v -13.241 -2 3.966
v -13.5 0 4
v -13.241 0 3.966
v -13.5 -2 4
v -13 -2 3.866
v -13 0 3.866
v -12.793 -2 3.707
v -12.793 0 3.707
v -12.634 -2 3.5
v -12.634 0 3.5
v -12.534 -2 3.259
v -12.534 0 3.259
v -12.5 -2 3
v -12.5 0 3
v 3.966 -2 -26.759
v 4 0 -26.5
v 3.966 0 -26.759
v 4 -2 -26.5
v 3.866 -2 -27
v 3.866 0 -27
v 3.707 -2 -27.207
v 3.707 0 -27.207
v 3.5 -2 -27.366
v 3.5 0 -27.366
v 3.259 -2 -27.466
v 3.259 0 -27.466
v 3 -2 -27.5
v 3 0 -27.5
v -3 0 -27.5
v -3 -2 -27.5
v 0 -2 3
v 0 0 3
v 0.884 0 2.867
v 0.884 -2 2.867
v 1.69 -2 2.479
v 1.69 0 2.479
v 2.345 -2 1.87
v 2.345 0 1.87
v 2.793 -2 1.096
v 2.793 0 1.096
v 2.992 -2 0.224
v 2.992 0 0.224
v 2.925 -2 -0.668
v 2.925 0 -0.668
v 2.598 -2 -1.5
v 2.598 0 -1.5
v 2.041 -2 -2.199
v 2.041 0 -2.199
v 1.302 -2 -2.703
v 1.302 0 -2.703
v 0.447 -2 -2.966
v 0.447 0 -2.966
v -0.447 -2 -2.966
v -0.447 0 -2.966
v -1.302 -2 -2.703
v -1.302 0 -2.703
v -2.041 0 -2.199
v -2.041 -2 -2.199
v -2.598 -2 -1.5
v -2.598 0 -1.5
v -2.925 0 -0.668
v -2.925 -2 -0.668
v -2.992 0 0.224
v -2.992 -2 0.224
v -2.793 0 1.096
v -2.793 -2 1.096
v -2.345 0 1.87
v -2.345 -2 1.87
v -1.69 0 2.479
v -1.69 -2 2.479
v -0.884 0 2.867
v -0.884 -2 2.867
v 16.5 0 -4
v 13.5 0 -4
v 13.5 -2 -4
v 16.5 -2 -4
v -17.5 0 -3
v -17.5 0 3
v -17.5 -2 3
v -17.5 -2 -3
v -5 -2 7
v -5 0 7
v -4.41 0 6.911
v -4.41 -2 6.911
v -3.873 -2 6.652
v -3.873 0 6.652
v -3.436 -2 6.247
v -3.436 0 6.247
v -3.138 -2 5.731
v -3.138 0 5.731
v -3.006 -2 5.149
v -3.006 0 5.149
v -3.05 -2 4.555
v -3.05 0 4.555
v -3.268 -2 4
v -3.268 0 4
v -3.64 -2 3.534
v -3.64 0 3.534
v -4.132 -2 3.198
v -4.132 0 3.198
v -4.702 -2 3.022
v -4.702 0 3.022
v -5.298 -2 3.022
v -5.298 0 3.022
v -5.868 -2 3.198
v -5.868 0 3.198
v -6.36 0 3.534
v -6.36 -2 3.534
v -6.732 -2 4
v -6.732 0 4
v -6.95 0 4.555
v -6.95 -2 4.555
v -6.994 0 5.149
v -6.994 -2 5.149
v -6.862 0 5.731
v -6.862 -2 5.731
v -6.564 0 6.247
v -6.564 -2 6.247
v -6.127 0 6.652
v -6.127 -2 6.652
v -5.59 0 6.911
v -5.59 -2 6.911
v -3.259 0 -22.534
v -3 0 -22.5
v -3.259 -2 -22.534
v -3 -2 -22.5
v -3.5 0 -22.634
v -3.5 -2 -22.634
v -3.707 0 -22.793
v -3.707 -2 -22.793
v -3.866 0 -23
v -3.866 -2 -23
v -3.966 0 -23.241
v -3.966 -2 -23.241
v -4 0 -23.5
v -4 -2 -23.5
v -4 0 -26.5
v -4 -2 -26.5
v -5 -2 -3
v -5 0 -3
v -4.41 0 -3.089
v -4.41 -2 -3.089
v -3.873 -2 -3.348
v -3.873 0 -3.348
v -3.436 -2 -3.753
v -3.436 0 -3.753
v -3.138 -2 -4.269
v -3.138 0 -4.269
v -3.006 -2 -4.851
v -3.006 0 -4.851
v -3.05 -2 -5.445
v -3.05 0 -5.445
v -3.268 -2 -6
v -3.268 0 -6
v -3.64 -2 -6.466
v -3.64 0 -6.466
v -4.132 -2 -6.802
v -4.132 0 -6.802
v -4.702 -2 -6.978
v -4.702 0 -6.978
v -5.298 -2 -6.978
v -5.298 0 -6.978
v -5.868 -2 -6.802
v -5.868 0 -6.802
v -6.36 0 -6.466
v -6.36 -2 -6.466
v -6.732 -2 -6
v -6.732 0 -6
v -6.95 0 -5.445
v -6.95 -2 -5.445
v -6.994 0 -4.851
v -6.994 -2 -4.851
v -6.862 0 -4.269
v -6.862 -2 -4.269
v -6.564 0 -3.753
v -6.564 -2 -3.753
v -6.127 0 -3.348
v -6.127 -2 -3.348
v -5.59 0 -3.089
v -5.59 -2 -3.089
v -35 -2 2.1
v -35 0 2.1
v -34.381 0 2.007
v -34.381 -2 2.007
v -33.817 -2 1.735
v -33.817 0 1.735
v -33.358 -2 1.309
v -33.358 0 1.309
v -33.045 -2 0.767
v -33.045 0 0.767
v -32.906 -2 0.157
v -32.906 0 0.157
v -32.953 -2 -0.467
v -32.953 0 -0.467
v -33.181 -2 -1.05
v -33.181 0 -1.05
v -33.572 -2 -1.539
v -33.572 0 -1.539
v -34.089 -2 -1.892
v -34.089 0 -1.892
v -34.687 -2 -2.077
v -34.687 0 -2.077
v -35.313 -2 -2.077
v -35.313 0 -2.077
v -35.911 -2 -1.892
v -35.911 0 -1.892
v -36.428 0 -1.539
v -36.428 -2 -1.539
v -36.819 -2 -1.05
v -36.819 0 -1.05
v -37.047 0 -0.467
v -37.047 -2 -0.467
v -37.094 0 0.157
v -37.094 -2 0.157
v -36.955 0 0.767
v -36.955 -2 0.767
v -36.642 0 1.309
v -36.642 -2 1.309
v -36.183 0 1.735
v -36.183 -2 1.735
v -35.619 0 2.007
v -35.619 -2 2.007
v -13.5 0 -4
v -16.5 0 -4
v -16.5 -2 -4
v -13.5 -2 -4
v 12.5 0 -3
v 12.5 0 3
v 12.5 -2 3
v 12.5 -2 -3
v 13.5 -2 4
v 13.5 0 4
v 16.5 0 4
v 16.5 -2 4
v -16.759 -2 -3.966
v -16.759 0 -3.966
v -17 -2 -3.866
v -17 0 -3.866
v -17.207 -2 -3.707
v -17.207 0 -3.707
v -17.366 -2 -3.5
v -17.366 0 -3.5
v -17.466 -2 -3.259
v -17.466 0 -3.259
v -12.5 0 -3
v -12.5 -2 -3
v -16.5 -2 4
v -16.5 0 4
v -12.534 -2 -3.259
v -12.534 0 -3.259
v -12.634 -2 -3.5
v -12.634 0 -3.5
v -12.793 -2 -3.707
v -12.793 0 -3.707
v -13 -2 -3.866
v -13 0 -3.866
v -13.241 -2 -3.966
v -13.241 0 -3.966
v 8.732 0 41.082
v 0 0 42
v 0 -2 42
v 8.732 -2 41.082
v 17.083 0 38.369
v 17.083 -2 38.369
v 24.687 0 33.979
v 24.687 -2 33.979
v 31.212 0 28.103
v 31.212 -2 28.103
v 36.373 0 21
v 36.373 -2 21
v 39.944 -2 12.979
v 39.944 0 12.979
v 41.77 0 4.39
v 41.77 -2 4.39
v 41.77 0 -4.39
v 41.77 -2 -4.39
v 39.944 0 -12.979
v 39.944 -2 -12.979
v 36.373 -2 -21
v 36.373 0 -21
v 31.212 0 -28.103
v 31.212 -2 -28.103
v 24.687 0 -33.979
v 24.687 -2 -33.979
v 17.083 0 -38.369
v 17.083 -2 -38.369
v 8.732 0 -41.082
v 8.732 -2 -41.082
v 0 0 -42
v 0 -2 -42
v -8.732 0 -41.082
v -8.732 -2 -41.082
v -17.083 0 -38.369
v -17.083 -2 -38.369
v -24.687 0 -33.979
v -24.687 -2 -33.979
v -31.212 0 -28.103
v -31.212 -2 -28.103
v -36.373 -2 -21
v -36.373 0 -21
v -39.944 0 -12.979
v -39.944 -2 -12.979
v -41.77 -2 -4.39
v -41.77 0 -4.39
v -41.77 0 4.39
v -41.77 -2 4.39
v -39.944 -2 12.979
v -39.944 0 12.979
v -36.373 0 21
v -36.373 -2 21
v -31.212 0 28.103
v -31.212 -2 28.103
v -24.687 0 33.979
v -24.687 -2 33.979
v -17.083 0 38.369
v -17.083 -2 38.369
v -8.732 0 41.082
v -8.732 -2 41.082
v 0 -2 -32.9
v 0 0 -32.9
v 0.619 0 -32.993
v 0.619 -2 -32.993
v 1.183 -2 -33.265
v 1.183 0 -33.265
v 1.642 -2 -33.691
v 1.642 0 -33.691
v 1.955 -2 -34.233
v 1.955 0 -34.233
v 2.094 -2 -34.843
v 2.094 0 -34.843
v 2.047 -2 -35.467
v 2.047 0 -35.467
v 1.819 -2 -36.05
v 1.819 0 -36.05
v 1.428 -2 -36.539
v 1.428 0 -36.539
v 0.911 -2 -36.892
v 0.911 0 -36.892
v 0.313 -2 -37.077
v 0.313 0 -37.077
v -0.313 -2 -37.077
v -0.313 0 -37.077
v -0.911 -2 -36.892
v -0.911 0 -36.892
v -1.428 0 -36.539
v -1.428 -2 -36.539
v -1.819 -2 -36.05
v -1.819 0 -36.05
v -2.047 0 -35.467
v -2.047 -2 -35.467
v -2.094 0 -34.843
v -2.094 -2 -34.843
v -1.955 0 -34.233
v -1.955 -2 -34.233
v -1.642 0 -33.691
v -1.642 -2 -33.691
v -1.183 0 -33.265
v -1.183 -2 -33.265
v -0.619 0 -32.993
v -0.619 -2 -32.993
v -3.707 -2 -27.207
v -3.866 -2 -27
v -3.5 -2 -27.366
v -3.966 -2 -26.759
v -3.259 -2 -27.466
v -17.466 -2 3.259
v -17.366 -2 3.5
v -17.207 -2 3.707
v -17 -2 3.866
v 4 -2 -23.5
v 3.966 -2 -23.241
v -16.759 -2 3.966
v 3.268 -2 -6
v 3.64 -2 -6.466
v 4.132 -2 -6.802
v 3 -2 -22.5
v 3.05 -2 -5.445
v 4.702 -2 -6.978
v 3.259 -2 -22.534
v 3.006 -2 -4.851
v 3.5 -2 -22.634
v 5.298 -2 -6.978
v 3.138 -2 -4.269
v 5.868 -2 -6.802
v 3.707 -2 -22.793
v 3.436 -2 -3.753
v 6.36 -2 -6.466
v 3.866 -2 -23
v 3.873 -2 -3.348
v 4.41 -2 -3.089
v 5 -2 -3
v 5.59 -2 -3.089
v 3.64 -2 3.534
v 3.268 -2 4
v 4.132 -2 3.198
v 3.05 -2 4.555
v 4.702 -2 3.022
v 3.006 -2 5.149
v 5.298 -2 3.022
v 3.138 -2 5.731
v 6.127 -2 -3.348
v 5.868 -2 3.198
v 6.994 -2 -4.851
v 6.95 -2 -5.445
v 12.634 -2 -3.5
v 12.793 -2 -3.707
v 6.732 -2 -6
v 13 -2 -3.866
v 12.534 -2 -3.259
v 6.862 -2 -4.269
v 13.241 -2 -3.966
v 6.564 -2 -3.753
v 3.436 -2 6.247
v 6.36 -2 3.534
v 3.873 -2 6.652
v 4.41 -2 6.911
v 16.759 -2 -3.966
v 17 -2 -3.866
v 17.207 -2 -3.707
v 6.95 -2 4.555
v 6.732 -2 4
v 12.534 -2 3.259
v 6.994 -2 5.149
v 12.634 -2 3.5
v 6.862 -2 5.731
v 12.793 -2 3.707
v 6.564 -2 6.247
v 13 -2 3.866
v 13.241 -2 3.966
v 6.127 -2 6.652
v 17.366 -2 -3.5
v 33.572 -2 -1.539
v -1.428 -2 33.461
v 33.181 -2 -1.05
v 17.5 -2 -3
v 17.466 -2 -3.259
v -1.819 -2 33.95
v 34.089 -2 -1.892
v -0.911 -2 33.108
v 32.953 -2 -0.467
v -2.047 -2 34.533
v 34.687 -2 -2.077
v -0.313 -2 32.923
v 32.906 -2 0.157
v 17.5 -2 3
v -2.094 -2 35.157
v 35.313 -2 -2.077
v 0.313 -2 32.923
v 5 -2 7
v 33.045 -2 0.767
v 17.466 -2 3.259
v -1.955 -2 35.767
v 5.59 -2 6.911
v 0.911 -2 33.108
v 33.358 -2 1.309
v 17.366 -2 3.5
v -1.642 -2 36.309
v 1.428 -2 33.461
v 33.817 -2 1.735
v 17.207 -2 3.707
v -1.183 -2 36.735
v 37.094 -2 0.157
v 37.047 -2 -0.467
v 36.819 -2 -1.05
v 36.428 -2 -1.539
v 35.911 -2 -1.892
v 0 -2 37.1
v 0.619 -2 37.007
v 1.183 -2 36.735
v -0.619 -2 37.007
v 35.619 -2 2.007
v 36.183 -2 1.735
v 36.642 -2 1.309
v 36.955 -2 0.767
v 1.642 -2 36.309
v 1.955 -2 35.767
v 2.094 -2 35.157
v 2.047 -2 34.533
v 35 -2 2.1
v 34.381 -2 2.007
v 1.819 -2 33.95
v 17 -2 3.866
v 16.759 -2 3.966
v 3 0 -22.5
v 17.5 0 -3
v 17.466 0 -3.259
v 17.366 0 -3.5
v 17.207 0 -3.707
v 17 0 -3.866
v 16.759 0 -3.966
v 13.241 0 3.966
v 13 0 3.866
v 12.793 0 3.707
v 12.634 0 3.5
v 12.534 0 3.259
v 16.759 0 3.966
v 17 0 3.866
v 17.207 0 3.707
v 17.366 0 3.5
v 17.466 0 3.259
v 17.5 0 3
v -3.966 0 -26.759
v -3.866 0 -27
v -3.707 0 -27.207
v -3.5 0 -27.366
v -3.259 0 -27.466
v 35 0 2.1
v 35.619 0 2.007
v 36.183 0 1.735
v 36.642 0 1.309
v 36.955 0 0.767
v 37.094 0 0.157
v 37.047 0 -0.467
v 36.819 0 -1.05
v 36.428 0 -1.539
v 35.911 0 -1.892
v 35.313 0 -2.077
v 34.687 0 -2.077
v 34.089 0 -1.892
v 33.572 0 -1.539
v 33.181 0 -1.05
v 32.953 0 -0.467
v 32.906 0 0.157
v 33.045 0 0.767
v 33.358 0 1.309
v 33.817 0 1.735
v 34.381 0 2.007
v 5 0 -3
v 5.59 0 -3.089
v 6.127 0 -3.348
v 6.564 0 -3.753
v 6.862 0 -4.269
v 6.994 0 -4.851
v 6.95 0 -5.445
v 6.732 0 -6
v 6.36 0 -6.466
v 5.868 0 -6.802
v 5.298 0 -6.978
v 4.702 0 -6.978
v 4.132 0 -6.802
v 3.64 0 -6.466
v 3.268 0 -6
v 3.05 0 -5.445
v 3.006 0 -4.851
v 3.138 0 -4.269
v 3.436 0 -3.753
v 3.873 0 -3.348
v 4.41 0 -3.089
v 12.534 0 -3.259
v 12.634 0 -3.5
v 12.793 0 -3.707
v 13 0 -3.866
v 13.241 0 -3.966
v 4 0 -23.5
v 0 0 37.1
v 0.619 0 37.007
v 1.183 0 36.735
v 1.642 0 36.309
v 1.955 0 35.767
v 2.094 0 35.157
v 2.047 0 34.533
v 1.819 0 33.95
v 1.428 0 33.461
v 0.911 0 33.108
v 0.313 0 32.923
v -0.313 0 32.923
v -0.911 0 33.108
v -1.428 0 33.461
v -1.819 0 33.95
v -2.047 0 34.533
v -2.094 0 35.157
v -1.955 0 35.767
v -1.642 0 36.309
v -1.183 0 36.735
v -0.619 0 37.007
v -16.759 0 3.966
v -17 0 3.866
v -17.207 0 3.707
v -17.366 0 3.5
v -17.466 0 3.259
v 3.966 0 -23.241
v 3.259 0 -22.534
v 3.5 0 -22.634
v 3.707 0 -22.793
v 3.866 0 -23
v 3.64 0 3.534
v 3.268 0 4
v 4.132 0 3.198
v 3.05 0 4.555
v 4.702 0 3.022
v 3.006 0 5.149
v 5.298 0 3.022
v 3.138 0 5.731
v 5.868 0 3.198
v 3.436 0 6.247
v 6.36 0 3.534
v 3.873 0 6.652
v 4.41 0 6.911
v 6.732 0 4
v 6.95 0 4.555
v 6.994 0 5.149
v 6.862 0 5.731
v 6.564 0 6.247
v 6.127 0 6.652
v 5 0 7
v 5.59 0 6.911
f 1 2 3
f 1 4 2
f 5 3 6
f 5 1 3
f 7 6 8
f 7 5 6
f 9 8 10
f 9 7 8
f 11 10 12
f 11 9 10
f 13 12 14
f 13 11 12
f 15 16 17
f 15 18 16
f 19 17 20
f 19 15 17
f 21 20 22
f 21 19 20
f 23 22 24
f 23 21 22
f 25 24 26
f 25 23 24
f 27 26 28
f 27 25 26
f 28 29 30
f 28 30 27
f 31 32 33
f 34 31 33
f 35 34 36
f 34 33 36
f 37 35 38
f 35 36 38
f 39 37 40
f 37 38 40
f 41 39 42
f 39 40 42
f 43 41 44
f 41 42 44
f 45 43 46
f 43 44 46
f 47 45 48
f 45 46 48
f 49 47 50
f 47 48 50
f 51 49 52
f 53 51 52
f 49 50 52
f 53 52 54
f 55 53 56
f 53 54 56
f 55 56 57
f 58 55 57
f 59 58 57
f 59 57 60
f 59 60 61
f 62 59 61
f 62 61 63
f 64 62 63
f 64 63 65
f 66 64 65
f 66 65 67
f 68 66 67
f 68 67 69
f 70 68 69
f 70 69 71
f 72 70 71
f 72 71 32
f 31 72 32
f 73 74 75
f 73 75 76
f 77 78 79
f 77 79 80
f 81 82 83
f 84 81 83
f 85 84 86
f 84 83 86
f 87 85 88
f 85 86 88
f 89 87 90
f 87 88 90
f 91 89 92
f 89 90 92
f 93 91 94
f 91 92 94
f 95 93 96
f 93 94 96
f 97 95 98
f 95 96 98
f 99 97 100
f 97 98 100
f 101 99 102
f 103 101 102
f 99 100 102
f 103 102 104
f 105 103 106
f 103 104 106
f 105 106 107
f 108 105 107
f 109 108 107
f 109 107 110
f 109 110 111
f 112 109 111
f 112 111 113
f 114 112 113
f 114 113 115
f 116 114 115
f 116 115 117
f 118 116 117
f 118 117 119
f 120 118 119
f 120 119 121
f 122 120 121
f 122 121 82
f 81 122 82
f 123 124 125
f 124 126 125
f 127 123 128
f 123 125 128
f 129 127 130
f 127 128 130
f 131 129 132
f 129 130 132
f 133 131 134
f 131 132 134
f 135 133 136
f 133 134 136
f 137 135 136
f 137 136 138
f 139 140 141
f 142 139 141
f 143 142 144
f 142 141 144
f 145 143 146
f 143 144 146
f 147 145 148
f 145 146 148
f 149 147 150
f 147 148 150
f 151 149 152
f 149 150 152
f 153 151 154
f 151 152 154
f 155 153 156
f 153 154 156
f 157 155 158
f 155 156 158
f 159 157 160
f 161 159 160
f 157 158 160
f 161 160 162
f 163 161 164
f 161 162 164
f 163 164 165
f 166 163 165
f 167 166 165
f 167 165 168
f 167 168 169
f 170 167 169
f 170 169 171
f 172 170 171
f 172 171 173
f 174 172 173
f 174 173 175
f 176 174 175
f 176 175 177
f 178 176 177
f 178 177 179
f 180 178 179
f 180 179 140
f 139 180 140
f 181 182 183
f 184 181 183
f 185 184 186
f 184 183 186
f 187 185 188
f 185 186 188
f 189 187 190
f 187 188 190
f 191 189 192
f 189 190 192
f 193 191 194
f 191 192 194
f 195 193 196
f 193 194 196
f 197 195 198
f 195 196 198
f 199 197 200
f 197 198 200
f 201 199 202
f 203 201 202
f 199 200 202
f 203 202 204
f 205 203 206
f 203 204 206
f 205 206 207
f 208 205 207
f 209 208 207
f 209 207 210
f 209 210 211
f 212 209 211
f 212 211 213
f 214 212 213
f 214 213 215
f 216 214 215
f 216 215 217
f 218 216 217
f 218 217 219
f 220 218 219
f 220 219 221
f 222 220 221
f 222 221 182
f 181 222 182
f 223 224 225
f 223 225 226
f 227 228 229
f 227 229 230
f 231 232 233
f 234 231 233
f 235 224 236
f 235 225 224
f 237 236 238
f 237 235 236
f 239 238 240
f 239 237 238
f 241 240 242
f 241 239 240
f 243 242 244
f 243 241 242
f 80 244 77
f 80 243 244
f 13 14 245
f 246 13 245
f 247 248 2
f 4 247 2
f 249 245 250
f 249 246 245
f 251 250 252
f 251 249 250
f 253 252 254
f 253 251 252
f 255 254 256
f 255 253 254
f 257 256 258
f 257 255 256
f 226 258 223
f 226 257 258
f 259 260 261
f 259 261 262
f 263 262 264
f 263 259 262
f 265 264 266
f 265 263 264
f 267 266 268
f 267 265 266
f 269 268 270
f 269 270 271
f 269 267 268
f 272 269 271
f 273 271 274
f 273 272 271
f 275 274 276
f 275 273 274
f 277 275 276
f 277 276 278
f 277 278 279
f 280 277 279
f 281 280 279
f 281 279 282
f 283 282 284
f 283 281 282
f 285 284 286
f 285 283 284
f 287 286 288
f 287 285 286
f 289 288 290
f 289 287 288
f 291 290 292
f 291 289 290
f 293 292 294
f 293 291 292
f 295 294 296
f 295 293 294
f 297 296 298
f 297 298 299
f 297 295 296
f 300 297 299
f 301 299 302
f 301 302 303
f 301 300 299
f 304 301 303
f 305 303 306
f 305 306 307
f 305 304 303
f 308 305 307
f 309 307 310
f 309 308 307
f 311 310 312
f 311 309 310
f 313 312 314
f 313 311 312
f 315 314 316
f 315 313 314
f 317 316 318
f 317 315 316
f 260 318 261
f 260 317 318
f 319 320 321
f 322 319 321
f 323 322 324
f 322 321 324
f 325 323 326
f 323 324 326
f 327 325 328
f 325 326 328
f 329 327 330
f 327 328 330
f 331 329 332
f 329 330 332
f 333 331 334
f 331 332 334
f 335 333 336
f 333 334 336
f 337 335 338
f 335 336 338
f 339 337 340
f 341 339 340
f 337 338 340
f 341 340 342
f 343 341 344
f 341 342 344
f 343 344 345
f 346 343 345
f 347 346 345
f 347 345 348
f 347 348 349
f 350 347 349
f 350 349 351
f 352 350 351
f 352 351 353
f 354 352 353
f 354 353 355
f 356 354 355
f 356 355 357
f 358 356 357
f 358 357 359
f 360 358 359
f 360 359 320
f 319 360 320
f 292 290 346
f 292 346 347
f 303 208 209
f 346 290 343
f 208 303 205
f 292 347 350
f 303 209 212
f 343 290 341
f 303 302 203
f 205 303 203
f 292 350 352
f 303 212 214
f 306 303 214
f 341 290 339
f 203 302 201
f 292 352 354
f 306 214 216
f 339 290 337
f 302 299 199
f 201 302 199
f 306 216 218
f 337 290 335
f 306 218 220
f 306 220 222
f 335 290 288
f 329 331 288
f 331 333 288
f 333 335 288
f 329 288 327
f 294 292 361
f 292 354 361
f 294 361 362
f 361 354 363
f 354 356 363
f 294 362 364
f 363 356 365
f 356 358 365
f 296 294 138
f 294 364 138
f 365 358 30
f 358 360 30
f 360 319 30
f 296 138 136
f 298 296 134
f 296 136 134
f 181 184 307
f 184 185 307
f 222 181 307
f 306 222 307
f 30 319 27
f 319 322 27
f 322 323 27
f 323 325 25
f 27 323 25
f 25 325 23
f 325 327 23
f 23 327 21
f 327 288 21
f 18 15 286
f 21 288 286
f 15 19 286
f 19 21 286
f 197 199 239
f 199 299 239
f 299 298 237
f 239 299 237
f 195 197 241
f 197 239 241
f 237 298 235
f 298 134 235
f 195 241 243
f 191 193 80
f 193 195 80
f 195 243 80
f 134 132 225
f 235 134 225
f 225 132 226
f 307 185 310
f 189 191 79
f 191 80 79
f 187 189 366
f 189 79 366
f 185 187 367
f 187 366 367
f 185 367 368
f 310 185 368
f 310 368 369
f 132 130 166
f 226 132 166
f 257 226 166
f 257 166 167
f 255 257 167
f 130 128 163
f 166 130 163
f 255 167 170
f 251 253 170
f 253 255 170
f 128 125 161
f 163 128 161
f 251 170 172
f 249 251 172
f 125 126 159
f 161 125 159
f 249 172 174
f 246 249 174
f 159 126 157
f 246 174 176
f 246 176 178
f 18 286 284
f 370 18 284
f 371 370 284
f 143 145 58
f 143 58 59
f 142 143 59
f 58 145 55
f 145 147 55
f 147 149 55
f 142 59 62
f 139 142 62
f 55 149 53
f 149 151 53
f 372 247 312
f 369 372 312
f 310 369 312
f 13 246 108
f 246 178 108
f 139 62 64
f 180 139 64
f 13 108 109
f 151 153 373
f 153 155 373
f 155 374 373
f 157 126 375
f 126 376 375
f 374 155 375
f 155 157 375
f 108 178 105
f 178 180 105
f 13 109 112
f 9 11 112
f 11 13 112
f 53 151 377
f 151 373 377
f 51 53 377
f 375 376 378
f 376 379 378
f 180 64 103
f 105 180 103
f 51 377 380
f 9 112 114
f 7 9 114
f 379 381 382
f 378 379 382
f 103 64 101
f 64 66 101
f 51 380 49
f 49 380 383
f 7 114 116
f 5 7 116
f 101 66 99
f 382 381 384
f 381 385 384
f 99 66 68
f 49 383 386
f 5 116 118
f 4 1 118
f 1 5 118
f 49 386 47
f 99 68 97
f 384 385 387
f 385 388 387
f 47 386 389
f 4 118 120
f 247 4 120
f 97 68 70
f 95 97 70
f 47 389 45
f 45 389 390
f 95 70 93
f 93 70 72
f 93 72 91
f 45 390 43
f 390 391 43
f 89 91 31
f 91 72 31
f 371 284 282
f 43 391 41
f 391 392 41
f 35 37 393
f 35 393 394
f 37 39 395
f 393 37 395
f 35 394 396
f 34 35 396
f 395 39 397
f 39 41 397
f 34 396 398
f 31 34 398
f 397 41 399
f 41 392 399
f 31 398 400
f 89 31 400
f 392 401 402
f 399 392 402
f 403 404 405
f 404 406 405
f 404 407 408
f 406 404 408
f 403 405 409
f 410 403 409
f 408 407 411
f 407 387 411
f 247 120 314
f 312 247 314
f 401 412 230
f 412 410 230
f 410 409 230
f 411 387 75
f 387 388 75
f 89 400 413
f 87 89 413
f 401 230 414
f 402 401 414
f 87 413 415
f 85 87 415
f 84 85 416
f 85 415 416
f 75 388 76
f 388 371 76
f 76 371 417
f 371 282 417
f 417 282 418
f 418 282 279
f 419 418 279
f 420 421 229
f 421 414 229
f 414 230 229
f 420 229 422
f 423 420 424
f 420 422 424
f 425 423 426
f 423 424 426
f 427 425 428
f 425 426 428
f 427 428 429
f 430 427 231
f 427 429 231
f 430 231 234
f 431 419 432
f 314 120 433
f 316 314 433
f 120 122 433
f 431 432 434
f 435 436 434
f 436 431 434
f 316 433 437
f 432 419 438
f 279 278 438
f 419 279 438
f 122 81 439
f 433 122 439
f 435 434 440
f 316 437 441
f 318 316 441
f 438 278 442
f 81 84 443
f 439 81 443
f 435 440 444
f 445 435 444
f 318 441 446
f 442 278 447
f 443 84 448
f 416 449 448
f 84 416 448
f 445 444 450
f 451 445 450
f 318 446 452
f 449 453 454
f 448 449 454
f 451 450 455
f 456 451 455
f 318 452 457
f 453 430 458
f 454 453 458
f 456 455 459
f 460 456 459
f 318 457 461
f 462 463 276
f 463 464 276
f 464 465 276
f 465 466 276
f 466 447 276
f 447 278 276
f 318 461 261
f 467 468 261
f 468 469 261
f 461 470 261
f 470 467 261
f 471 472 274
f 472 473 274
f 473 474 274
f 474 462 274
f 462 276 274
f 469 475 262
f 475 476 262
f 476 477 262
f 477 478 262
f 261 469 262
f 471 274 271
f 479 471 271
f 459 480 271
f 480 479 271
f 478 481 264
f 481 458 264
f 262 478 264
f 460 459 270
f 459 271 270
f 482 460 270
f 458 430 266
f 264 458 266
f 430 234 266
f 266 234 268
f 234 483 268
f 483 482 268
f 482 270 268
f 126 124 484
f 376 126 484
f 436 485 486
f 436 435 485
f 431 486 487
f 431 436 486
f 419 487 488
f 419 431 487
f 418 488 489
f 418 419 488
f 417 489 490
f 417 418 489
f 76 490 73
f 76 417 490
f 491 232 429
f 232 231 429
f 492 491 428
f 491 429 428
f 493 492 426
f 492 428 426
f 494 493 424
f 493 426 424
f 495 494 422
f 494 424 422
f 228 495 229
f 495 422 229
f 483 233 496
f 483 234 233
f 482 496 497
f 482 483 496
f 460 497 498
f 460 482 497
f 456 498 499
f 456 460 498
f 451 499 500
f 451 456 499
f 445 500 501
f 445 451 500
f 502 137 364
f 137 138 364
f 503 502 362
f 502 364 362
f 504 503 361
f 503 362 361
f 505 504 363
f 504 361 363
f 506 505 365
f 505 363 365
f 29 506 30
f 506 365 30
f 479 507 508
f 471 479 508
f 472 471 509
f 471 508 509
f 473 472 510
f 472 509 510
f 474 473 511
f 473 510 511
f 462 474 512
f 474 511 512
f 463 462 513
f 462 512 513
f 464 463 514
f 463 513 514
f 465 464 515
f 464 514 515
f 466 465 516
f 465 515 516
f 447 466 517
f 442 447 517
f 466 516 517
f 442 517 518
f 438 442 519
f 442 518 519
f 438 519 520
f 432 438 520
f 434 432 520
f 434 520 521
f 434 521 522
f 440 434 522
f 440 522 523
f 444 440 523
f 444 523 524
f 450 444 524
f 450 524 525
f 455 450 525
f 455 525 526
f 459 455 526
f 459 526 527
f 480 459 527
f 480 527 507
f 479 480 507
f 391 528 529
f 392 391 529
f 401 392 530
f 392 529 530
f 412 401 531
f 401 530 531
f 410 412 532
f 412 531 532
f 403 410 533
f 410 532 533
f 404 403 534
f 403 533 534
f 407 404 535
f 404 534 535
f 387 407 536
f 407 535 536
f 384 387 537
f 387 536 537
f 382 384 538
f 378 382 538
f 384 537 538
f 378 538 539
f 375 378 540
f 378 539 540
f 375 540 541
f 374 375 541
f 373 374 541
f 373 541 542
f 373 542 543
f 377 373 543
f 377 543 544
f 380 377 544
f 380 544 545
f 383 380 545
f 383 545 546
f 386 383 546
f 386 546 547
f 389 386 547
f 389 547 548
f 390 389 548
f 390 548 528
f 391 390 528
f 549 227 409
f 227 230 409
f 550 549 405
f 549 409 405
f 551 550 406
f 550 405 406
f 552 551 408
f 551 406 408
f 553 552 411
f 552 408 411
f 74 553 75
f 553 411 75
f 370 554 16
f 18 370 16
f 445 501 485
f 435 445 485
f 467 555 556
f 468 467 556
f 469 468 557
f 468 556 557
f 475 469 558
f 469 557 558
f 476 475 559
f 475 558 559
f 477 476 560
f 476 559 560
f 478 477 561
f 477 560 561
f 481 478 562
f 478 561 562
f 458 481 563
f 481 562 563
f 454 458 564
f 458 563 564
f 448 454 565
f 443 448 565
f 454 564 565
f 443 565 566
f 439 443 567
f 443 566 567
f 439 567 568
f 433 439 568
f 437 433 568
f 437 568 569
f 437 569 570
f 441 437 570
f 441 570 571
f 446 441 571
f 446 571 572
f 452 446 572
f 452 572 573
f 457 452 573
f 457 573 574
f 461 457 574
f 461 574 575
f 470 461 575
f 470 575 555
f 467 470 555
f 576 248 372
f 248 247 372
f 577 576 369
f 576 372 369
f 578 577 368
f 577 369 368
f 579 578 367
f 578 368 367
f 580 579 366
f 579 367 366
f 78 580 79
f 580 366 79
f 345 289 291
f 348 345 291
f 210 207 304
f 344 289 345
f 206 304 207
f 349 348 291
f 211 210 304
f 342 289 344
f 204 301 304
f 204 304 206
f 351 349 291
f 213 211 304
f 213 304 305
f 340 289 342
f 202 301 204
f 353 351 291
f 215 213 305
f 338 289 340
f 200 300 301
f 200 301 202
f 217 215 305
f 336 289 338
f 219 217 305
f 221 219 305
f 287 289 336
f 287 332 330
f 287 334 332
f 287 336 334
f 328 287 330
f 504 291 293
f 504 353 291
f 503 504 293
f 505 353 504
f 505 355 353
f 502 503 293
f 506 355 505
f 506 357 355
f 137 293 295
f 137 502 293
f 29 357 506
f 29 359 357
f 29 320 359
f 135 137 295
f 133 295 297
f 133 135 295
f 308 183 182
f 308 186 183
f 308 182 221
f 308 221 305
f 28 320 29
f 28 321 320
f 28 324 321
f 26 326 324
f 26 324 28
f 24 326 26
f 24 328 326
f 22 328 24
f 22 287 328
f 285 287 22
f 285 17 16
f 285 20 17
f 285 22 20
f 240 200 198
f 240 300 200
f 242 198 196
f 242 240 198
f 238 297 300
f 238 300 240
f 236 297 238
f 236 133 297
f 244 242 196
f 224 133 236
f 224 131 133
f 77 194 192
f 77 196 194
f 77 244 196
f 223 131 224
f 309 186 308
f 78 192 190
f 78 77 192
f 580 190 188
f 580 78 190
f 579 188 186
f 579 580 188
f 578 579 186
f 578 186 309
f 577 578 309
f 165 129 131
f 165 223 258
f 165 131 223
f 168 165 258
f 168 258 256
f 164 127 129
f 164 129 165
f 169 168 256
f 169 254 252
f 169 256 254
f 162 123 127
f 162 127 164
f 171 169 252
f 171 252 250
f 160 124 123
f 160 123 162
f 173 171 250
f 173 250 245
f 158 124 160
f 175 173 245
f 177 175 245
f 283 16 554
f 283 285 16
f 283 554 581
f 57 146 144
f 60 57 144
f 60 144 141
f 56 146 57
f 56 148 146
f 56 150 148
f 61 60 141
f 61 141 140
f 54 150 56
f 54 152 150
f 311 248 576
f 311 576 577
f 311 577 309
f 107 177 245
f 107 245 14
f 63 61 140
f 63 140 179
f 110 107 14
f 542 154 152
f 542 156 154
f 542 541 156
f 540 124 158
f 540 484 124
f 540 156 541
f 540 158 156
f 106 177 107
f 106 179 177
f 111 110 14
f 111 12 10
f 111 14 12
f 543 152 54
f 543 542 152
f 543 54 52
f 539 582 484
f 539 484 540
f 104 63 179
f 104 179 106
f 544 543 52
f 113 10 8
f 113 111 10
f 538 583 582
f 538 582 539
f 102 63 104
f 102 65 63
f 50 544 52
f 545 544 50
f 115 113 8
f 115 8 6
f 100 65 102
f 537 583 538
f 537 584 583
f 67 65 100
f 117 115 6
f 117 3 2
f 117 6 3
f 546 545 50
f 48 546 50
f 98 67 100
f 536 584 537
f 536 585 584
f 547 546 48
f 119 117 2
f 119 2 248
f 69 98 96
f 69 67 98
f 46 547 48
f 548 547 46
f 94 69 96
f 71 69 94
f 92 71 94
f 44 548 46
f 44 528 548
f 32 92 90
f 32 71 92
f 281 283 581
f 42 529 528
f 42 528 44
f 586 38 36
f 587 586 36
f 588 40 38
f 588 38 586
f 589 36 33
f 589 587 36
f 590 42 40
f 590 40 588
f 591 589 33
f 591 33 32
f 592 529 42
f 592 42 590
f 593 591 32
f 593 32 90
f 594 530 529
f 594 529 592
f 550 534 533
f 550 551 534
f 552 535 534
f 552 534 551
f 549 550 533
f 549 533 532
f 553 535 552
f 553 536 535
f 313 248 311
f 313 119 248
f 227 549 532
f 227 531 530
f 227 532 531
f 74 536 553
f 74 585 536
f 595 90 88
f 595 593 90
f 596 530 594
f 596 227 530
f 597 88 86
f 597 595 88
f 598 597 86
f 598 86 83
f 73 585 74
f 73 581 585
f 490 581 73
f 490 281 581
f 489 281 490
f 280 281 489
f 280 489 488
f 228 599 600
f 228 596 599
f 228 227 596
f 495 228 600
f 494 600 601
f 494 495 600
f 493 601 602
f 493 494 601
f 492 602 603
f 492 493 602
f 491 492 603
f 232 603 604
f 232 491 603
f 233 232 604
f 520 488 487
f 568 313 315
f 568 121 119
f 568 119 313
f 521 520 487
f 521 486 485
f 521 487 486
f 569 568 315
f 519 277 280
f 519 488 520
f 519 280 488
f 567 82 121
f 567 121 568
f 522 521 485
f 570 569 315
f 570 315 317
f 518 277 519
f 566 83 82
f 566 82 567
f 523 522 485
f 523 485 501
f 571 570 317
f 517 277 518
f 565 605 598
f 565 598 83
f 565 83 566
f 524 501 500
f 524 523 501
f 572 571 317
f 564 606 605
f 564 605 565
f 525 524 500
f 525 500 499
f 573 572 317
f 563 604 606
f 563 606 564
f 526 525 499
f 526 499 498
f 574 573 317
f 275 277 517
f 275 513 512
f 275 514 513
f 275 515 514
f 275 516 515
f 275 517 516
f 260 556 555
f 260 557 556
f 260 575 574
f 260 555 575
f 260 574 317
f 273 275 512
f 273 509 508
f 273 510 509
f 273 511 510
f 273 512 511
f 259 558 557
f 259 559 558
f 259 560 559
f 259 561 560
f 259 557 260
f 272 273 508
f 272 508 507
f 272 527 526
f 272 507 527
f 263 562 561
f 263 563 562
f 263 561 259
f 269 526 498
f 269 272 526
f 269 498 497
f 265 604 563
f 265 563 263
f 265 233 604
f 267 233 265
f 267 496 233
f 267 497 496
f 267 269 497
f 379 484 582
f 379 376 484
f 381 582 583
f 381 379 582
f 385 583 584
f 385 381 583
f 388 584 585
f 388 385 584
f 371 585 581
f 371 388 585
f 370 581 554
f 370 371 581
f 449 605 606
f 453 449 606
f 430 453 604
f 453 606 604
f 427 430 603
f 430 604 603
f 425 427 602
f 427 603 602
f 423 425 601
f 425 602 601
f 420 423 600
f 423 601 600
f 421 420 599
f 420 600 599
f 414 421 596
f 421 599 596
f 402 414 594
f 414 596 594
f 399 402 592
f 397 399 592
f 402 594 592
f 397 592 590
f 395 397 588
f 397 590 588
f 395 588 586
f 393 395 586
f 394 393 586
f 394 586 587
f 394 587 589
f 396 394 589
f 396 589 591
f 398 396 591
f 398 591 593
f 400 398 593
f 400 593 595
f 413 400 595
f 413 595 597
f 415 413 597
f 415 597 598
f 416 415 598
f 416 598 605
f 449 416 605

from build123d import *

# Parameters (mm, degrees)
SKETCH_1_R             = 42
SM_BASE_FLANGE_1_DEPTH = 2
CUT_EXTRUDE_1_REACH    = 61.431
SKETCH_6_R             = 2.1
SKETCH_6_R_2           = 3
SKETCH_6_R_3           = 2
SKETCH_6_W             = 8
SKETCH_6_H             = 5
SKETCH_6_W_2           = 5
SKETCH_6_H_2           = 8
FILLET_1_R             = 1


# Sheet-metal steps are written as plain solids
with BuildPart() as part:
    # Sketch 1 → 基体-法兰1 (new body)
    with BuildSketch(Plane(origin=(0, 0, 0), x_dir=(1, 0, 0), z_dir=(0, 1, 0))):
        with Locations(Location((0, 0, 0), (0, 0, 270))):
            Circle(SKETCH_1_R)
    extrude(amount=-SM_BASE_FLANGE_1_DEPTH)

    # 草图6 → 切除-拉伸1 (cut, up to next)
    with BuildSketch(Plane(origin=(0, 0, 0), x_dir=(1, 0, 0), z_dir=(0, 1, 0)), mode=Mode.PRIVATE) as cut_extrude_1_sk1:
        with Locations(Location((0, 35, 0), (0, 0, 270))):
            Circle(SKETCH_6_R)
    cut_extrude_1_tool1 = extrude(cut_extrude_1_sk1.sketch, amount=-CUT_EXTRUDE_1_REACH, mode=Mode.PRIVATE) & part.part
    # 草图6 → 切除-拉伸1 (cut, up to next)
    with BuildSketch(Plane(origin=(0, 0, 0), x_dir=(1, 0, 0), z_dir=(0, 1, 0)), mode=Mode.PRIVATE) as cut_extrude_1_sk2:
        with Locations(Location((35, 0, 0), (0, 0, 270))):
            Circle(SKETCH_6_R)
    cut_extrude_1_tool2 = extrude(cut_extrude_1_sk2.sketch, amount=-CUT_EXTRUDE_1_REACH, mode=Mode.PRIVATE) & part.part
    # 草图6 → 切除-拉伸1 (cut, up to next)
    with BuildSketch(Plane(origin=(0, 0, 0), x_dir=(1, 0, 0), z_dir=(0, 1, 0)), mode=Mode.PRIVATE) as cut_extrude_1_sk3:
        with Locations(Location((0, -35, 0), (0, 0, 270))):
            Circle(SKETCH_6_R)
    cut_extrude_1_tool3 = extrude(cut_extrude_1_sk3.sketch, amount=-CUT_EXTRUDE_1_REACH, mode=Mode.PRIVATE) & part.part
    # 草图6 → 切除-拉伸1 (cut, up to next)
    with BuildSketch(Plane(origin=(0, 0, 0), x_dir=(1, 0, 0), z_dir=(0, 1, 0)), mode=Mode.PRIVATE) as cut_extrude_1_sk4:
        with Locations(Location((-35, 0, 0), (0, 0, 270))):
            Circle(SKETCH_6_R)
    cut_extrude_1_tool4 = extrude(cut_extrude_1_sk4.sketch, amount=-CUT_EXTRUDE_1_REACH, mode=Mode.PRIVATE) & part.part
    # 草图6 → 切除-拉伸1 (cut, up to next)
    with BuildSketch(Plane(origin=(0, 0, 0), x_dir=(1, 0, 0), z_dir=(0, 1, 0)), mode=Mode.PRIVATE) as cut_extrude_1_sk5:
        with Locations(Location((0, 0, 0), (0, 0, 270))):
            Circle(SKETCH_6_R_2)
    cut_extrude_1_tool5 = extrude(cut_extrude_1_sk5.sketch, amount=-CUT_EXTRUDE_1_REACH, mode=Mode.PRIVATE) & part.part
    # 草图6 → 切除-拉伸1 (cut, up to next)
    with BuildSketch(Plane(origin=(0, 0, 0), x_dir=(1, 0, 0), z_dir=(0, 1, 0)), mode=Mode.PRIVATE) as cut_extrude_1_sk6:
        with Locations(Location((-5, 5, 0), (0, 0, 270))):
            Circle(SKETCH_6_R_3)
    cut_extrude_1_tool6 = extrude(cut_extrude_1_sk6.sketch, amount=-CUT_EXTRUDE_1_REACH, mode=Mode.PRIVATE) & part.part
    # 草图6 → 切除-拉伸1 (cut, up to next)
    with BuildSketch(Plane(origin=(0, 0, 0), x_dir=(1, 0, 0), z_dir=(0, 1, 0)), mode=Mode.PRIVATE) as cut_extrude_1_sk7:
        with Locations(Location((5, 5, 0), (0, 0, 270))):
            Circle(SKETCH_6_R_3)
    cut_extrude_1_tool7 = extrude(cut_extrude_1_sk7.sketch, amount=-CUT_EXTRUDE_1_REACH, mode=Mode.PRIVATE) & part.part
    # 草图6 → 切除-拉伸1 (cut, up to next)
    with BuildSketch(Plane(origin=(0, 0, 0), x_dir=(1, 0, 0), z_dir=(0, 1, 0)), mode=Mode.PRIVATE) as cut_extrude_1_sk8:
        with Locations(Location((5, -5, 0), (0, 0, 270))):
            Circle(SKETCH_6_R_3)
    cut_extrude_1_tool8 = extrude(cut_extrude_1_sk8.sketch, amount=-CUT_EXTRUDE_1_REACH, mode=Mode.PRIVATE) & part.part
    # 草图6 → 切除-拉伸1 (cut, up to next)
    with BuildSketch(Plane(origin=(0, 0, 0), x_dir=(1, 0, 0), z_dir=(0, 1, 0)), mode=Mode.PRIVATE) as cut_extrude_1_sk9:
        with Locations(Location((-5, -5, 0), (0, 0, 270))):
            Circle(SKETCH_6_R_3)
    cut_extrude_1_tool9 = extrude(cut_extrude_1_sk9.sketch, amount=-CUT_EXTRUDE_1_REACH, mode=Mode.PRIVATE) & part.part
    # 草图6 → 切除-拉伸1 (cut, up to next)
    with BuildSketch(Plane(origin=(0, 0, 0), x_dir=(1, 0, 0), z_dir=(0, 1, 0)), mode=Mode.PRIVATE) as cut_extrude_1_sk10:
        with Locations((0, 25)):
            Rectangle(SKETCH_6_W, SKETCH_6_H)
    cut_extrude_1_tool10 = extrude(cut_extrude_1_sk10.sketch, amount=-CUT_EXTRUDE_1_REACH, mode=Mode.PRIVATE) & part.part
    # 草图6 → 切除-拉伸1 (cut, up to next)
    with BuildSketch(Plane(origin=(0, 0, 0), x_dir=(1, 0, 0), z_dir=(0, 1, 0)), mode=Mode.PRIVATE) as cut_extrude_1_sk11:
        with Locations((15, 0)):
            Rectangle(SKETCH_6_W_2, SKETCH_6_H_2)
    cut_extrude_1_tool11 = extrude(cut_extrude_1_sk11.sketch, amount=-CUT_EXTRUDE_1_REACH, mode=Mode.PRIVATE) & part.part
    # 草图6 → 切除-拉伸1 (cut, up to next)
    with BuildSketch(Plane(origin=(0, 0, 0), x_dir=(1, 0, 0), z_dir=(0, 1, 0)), mode=Mode.PRIVATE) as cut_extrude_1_sk12:
        with Locations((-15, 0)):
            Rectangle(SKETCH_6_W_2, SKETCH_6_H_2)
    cut_extrude_1_tool12 = extrude(cut_extrude_1_sk12.sketch, amount=-CUT_EXTRUDE_1_REACH, mode=Mode.PRIVATE) & part.part
    add(cut_extrude_1_tool1.solids().sort_by_distance((0, 0, -35))[0], mode=Mode.SUBTRACT)
    add(cut_extrude_1_tool2.solids().sort_by_distance((35, 0, 0))[0], mode=Mode.SUBTRACT)
    add(cut_extrude_1_tool3.solids().sort_by_distance((0, 0, 35))[0], mode=Mode.SUBTRACT)
    add(cut_extrude_1_tool4.solids().sort_by_distance((-35, 0, 0))[0], mode=Mode.SUBTRACT)
    add(cut_extrude_1_tool5.solids().sort_by_distance((0, 0, 0))[0], mode=Mode.SUBTRACT)
    add(cut_extrude_1_tool6.solids().sort_by_distance((-5, 0, -5))[0], mode=Mode.SUBTRACT)
    add(cut_extrude_1_tool7.solids().sort_by_distance((5, 0, -5))[0], mode=Mode.SUBTRACT)
    add(cut_extrude_1_tool8.solids().sort_by_distance((5, 0, 5))[0], mode=Mode.SUBTRACT)
    add(cut_extrude_1_tool9.solids().sort_by_distance((-5, 0, 5))[0], mode=Mode.SUBTRACT)
    add(cut_extrude_1_tool10.solids().sort_by_distance((0, 0, -25))[0], mode=Mode.SUBTRACT)
    add(cut_extrude_1_tool11.solids().sort_by_distance((15, 0, 0))[0], mode=Mode.SUBTRACT)
    add(cut_extrude_1_tool12.solids().sort_by_distance((-15, 0, 0))[0], mode=Mode.SUBTRACT)

    # 圆角1
    fillet_1_edges = [part.edges().sort_by_distance(p)[0] for p in [
        (17.5, -1, -4),
        (17.5, -1, 4),
        (12.5, -1, 4),
        (12.5, -1, -4),
        (-12.5, -1, -4),
        (-12.5, -1, 4),
        (-17.5, -1, 4),
        (-17.5, -1, -4),
        (-4, -1, -22.5),
        (-4, -1, -27.5),
        (4, -1, -27.5),
        (4, -1, -22.5),
    ]]
    fillet(fillet_1_edges, radius=FILLET_1_R)


solid = part.part
